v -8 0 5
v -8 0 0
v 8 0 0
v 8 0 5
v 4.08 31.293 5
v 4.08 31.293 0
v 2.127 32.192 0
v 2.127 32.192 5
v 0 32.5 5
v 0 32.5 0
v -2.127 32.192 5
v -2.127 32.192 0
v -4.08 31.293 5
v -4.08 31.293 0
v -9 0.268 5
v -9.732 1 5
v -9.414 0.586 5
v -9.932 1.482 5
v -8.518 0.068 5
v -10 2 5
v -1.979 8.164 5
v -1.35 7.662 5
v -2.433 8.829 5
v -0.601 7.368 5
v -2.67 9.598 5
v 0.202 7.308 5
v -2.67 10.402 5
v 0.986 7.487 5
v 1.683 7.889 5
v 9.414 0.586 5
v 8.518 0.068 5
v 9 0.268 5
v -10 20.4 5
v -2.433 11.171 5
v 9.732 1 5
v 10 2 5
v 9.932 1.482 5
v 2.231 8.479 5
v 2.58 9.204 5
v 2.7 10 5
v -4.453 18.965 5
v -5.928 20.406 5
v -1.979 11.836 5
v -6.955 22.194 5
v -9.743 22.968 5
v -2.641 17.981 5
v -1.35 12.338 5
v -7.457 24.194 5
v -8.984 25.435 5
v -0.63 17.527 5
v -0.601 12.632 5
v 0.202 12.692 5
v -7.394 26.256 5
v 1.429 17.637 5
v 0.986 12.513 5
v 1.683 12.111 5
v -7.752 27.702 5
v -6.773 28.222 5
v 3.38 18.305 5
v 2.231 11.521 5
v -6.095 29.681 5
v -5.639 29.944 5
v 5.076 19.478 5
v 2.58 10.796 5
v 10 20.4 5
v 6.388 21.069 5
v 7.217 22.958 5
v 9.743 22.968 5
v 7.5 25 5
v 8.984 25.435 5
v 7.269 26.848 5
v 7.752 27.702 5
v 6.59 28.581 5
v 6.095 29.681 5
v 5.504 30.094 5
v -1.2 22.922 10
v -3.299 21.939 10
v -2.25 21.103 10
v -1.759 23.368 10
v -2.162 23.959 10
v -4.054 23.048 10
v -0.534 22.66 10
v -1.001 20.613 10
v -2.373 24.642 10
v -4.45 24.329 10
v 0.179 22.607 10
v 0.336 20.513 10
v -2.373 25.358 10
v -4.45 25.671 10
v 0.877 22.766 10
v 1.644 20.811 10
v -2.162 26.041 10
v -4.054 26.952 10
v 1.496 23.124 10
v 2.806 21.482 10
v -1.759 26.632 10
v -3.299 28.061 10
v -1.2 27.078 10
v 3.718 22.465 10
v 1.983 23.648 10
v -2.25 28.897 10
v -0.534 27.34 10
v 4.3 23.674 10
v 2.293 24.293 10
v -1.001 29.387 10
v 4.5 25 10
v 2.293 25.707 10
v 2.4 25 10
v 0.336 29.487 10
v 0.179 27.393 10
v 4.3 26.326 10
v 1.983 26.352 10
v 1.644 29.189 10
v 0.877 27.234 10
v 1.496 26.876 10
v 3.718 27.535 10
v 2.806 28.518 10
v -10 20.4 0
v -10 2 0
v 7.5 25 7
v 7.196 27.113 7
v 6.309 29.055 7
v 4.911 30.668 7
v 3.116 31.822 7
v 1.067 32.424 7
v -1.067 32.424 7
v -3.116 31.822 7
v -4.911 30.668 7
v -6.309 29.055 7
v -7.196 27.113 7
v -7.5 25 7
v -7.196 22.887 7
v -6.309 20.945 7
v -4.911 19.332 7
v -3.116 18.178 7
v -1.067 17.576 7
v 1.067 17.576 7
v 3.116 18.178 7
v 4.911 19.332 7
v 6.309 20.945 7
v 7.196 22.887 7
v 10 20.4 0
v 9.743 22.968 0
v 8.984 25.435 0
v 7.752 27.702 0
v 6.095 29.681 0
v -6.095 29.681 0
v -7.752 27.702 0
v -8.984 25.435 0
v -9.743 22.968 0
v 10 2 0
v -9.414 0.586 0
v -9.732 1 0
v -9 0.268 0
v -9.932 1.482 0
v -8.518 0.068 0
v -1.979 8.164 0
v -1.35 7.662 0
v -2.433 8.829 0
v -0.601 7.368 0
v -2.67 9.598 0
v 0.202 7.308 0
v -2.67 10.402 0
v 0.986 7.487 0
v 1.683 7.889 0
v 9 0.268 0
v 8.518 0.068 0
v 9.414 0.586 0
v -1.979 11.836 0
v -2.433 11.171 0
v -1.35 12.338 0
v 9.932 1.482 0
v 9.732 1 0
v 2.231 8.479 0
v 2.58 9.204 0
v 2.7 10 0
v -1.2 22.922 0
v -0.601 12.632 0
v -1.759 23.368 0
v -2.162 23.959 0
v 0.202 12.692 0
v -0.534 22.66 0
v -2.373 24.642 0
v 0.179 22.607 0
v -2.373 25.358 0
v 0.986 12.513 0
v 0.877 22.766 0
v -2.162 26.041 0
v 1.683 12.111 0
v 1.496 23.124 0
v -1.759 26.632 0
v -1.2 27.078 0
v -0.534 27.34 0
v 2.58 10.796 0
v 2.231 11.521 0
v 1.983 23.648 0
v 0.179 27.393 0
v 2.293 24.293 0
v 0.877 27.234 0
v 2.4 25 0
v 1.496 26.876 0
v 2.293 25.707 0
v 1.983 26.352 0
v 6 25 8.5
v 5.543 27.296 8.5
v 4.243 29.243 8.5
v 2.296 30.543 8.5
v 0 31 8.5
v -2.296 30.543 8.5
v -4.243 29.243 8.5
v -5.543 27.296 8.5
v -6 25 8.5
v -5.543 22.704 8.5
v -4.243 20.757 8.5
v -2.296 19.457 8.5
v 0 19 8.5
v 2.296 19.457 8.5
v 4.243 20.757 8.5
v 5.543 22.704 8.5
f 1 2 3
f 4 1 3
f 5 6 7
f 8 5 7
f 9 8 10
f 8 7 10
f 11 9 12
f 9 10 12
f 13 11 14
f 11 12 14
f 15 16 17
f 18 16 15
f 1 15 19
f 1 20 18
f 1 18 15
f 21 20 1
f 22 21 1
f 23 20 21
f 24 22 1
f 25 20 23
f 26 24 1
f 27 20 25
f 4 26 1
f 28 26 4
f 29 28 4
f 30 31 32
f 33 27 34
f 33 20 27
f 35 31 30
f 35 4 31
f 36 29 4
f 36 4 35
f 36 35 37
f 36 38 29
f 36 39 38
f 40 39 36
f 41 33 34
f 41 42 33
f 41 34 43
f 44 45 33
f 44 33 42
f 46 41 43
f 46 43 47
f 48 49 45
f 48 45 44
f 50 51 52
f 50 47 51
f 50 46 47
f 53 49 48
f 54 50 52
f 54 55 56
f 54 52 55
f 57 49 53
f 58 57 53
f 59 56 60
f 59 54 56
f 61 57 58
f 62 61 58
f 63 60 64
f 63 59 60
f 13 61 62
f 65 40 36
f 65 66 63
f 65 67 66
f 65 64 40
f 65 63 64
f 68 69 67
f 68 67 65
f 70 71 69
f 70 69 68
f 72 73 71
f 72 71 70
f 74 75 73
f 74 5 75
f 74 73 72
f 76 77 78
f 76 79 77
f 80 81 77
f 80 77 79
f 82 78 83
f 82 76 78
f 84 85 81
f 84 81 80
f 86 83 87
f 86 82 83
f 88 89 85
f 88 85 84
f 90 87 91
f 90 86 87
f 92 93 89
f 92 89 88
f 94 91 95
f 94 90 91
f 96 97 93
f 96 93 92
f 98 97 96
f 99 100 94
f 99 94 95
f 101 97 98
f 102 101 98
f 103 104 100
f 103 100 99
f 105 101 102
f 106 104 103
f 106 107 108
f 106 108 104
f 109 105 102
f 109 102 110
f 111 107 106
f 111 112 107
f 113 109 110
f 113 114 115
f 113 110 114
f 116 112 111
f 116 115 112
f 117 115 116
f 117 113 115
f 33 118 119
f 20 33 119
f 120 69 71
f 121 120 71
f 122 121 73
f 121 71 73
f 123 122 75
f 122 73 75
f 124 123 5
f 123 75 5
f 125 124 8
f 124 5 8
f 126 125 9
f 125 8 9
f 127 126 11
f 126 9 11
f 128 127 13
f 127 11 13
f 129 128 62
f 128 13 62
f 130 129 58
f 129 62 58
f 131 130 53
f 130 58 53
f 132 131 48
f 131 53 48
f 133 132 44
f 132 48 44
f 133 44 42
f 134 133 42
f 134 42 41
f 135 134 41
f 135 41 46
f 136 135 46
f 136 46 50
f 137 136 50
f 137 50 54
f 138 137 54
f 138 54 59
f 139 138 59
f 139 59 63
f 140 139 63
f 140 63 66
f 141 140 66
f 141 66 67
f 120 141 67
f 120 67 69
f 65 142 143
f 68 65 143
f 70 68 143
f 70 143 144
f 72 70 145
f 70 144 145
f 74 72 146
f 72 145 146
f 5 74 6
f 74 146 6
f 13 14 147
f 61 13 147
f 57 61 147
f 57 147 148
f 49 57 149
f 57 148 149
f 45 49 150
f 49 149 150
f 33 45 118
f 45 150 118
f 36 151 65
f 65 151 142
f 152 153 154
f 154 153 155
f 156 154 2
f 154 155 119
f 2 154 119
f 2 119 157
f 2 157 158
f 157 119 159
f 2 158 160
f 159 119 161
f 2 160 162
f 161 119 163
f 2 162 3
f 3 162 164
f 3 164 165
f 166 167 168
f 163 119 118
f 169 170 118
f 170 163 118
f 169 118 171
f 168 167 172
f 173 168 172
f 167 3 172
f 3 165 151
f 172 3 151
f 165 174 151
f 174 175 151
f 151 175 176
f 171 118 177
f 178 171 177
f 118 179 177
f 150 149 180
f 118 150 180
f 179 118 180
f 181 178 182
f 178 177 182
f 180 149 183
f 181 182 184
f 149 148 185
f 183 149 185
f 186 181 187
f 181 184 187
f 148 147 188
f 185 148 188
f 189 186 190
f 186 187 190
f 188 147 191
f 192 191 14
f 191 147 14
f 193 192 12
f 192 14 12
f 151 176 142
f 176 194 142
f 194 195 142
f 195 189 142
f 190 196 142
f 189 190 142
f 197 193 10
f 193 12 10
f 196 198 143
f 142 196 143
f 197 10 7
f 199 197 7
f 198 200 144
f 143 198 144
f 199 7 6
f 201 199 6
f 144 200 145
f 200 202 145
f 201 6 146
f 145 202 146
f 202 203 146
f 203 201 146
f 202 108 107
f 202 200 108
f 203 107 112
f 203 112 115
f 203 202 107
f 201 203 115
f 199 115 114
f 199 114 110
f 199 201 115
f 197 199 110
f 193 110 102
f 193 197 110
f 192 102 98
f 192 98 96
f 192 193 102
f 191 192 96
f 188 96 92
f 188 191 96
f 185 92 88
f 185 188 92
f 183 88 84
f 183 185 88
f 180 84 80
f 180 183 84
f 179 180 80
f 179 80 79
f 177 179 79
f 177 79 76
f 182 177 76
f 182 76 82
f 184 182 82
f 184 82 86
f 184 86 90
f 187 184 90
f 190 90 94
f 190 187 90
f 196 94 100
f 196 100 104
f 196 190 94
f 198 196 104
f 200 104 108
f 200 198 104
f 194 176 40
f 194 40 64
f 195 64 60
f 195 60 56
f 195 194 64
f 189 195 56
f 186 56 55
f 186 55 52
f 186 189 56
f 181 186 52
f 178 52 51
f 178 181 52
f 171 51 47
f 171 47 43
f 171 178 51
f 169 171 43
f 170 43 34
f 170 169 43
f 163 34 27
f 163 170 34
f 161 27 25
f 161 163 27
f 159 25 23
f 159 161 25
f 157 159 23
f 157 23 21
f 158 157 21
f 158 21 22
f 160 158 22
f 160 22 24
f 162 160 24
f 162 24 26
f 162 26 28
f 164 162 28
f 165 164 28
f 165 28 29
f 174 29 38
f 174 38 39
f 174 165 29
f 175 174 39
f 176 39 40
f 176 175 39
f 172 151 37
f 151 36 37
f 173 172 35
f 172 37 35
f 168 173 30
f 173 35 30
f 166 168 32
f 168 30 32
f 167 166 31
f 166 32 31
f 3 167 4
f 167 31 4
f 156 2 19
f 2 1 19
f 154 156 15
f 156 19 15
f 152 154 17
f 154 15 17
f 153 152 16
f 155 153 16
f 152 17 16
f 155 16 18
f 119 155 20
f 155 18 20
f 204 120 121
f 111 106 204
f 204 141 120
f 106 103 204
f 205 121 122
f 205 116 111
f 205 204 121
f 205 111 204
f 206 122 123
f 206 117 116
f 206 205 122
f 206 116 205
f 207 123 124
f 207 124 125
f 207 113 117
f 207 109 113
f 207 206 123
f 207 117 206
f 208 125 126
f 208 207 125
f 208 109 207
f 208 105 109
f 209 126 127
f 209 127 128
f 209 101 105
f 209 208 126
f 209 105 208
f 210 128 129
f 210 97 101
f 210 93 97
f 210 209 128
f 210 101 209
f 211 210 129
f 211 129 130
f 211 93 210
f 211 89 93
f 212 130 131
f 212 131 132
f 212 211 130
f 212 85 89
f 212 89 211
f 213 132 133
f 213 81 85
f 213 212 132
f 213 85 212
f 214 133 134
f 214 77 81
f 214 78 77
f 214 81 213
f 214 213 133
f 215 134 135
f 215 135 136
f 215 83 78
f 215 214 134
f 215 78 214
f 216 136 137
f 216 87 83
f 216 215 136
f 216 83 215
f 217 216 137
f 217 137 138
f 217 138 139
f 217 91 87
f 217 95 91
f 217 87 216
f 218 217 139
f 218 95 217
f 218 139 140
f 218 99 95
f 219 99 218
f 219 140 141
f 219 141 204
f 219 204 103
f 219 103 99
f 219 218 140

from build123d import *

# Parameters (mm, degrees)
F0_R     = 2.7
F0_R_2   = 2.4
F1_DEPTH = 5
F2_R     = 7.5
F2_R_2   = 2.4
F3_DEPTH = 5
F4_SIZE  = 3
F5_R     = 2


with BuildPart() as f1:
    # F0 (on Top) → F1 (new body)
    with BuildSketch(Plane.XY):
        with BuildLine():
            Line((-10, 20.4), (-10, 0))
            Line((-10, 0), (10, 0))
            Line((10, 0), (10, 20.4))
            ThreePointArc((10, 20.4), (8.424303, 26.599078), (4.079715, 31.293324))
            ThreePointArc((4.079715, 31.293324), (0, 32.5), (-4.079715, 31.293324))
            ThreePointArc((-4.079715, 31.293324), (-8.424303, 26.599078), (-10, 20.4))
        make_face()
        with Locations((0, 10)):
            Circle(F0_R, mode=Mode.SUBTRACT)
        with Locations((0, 25)):
            Circle(F0_R_2, mode=Mode.SUBTRACT)
    extrude(amount=F1_DEPTH)

    # F2 (on face) → F3 (join)
    with BuildSketch(Plane.XY.offset(5)):
        with Locations((0, 25)):
            Circle(F2_R)
        with Locations((0, 25)):
            Circle(F2_R_2, mode=Mode.SUBTRACT)
    extrude(amount=F3_DEPTH)

    # F4
    f4_edges = [f1.edges().sort_by_distance(p)[0] for p in [
        (-7.5, 25, 10),
    ]]
    chamfer(f4_edges, length=F4_SIZE)

    # F5
    f5_edges = [f1.edges().sort_by_distance(p)[0] for p in [
        (-10, 0, 2.5),
        (10, 0, 2.5),
    ]]
    fillet(f5_edges, radius=F5_R)


solid = f1.part
